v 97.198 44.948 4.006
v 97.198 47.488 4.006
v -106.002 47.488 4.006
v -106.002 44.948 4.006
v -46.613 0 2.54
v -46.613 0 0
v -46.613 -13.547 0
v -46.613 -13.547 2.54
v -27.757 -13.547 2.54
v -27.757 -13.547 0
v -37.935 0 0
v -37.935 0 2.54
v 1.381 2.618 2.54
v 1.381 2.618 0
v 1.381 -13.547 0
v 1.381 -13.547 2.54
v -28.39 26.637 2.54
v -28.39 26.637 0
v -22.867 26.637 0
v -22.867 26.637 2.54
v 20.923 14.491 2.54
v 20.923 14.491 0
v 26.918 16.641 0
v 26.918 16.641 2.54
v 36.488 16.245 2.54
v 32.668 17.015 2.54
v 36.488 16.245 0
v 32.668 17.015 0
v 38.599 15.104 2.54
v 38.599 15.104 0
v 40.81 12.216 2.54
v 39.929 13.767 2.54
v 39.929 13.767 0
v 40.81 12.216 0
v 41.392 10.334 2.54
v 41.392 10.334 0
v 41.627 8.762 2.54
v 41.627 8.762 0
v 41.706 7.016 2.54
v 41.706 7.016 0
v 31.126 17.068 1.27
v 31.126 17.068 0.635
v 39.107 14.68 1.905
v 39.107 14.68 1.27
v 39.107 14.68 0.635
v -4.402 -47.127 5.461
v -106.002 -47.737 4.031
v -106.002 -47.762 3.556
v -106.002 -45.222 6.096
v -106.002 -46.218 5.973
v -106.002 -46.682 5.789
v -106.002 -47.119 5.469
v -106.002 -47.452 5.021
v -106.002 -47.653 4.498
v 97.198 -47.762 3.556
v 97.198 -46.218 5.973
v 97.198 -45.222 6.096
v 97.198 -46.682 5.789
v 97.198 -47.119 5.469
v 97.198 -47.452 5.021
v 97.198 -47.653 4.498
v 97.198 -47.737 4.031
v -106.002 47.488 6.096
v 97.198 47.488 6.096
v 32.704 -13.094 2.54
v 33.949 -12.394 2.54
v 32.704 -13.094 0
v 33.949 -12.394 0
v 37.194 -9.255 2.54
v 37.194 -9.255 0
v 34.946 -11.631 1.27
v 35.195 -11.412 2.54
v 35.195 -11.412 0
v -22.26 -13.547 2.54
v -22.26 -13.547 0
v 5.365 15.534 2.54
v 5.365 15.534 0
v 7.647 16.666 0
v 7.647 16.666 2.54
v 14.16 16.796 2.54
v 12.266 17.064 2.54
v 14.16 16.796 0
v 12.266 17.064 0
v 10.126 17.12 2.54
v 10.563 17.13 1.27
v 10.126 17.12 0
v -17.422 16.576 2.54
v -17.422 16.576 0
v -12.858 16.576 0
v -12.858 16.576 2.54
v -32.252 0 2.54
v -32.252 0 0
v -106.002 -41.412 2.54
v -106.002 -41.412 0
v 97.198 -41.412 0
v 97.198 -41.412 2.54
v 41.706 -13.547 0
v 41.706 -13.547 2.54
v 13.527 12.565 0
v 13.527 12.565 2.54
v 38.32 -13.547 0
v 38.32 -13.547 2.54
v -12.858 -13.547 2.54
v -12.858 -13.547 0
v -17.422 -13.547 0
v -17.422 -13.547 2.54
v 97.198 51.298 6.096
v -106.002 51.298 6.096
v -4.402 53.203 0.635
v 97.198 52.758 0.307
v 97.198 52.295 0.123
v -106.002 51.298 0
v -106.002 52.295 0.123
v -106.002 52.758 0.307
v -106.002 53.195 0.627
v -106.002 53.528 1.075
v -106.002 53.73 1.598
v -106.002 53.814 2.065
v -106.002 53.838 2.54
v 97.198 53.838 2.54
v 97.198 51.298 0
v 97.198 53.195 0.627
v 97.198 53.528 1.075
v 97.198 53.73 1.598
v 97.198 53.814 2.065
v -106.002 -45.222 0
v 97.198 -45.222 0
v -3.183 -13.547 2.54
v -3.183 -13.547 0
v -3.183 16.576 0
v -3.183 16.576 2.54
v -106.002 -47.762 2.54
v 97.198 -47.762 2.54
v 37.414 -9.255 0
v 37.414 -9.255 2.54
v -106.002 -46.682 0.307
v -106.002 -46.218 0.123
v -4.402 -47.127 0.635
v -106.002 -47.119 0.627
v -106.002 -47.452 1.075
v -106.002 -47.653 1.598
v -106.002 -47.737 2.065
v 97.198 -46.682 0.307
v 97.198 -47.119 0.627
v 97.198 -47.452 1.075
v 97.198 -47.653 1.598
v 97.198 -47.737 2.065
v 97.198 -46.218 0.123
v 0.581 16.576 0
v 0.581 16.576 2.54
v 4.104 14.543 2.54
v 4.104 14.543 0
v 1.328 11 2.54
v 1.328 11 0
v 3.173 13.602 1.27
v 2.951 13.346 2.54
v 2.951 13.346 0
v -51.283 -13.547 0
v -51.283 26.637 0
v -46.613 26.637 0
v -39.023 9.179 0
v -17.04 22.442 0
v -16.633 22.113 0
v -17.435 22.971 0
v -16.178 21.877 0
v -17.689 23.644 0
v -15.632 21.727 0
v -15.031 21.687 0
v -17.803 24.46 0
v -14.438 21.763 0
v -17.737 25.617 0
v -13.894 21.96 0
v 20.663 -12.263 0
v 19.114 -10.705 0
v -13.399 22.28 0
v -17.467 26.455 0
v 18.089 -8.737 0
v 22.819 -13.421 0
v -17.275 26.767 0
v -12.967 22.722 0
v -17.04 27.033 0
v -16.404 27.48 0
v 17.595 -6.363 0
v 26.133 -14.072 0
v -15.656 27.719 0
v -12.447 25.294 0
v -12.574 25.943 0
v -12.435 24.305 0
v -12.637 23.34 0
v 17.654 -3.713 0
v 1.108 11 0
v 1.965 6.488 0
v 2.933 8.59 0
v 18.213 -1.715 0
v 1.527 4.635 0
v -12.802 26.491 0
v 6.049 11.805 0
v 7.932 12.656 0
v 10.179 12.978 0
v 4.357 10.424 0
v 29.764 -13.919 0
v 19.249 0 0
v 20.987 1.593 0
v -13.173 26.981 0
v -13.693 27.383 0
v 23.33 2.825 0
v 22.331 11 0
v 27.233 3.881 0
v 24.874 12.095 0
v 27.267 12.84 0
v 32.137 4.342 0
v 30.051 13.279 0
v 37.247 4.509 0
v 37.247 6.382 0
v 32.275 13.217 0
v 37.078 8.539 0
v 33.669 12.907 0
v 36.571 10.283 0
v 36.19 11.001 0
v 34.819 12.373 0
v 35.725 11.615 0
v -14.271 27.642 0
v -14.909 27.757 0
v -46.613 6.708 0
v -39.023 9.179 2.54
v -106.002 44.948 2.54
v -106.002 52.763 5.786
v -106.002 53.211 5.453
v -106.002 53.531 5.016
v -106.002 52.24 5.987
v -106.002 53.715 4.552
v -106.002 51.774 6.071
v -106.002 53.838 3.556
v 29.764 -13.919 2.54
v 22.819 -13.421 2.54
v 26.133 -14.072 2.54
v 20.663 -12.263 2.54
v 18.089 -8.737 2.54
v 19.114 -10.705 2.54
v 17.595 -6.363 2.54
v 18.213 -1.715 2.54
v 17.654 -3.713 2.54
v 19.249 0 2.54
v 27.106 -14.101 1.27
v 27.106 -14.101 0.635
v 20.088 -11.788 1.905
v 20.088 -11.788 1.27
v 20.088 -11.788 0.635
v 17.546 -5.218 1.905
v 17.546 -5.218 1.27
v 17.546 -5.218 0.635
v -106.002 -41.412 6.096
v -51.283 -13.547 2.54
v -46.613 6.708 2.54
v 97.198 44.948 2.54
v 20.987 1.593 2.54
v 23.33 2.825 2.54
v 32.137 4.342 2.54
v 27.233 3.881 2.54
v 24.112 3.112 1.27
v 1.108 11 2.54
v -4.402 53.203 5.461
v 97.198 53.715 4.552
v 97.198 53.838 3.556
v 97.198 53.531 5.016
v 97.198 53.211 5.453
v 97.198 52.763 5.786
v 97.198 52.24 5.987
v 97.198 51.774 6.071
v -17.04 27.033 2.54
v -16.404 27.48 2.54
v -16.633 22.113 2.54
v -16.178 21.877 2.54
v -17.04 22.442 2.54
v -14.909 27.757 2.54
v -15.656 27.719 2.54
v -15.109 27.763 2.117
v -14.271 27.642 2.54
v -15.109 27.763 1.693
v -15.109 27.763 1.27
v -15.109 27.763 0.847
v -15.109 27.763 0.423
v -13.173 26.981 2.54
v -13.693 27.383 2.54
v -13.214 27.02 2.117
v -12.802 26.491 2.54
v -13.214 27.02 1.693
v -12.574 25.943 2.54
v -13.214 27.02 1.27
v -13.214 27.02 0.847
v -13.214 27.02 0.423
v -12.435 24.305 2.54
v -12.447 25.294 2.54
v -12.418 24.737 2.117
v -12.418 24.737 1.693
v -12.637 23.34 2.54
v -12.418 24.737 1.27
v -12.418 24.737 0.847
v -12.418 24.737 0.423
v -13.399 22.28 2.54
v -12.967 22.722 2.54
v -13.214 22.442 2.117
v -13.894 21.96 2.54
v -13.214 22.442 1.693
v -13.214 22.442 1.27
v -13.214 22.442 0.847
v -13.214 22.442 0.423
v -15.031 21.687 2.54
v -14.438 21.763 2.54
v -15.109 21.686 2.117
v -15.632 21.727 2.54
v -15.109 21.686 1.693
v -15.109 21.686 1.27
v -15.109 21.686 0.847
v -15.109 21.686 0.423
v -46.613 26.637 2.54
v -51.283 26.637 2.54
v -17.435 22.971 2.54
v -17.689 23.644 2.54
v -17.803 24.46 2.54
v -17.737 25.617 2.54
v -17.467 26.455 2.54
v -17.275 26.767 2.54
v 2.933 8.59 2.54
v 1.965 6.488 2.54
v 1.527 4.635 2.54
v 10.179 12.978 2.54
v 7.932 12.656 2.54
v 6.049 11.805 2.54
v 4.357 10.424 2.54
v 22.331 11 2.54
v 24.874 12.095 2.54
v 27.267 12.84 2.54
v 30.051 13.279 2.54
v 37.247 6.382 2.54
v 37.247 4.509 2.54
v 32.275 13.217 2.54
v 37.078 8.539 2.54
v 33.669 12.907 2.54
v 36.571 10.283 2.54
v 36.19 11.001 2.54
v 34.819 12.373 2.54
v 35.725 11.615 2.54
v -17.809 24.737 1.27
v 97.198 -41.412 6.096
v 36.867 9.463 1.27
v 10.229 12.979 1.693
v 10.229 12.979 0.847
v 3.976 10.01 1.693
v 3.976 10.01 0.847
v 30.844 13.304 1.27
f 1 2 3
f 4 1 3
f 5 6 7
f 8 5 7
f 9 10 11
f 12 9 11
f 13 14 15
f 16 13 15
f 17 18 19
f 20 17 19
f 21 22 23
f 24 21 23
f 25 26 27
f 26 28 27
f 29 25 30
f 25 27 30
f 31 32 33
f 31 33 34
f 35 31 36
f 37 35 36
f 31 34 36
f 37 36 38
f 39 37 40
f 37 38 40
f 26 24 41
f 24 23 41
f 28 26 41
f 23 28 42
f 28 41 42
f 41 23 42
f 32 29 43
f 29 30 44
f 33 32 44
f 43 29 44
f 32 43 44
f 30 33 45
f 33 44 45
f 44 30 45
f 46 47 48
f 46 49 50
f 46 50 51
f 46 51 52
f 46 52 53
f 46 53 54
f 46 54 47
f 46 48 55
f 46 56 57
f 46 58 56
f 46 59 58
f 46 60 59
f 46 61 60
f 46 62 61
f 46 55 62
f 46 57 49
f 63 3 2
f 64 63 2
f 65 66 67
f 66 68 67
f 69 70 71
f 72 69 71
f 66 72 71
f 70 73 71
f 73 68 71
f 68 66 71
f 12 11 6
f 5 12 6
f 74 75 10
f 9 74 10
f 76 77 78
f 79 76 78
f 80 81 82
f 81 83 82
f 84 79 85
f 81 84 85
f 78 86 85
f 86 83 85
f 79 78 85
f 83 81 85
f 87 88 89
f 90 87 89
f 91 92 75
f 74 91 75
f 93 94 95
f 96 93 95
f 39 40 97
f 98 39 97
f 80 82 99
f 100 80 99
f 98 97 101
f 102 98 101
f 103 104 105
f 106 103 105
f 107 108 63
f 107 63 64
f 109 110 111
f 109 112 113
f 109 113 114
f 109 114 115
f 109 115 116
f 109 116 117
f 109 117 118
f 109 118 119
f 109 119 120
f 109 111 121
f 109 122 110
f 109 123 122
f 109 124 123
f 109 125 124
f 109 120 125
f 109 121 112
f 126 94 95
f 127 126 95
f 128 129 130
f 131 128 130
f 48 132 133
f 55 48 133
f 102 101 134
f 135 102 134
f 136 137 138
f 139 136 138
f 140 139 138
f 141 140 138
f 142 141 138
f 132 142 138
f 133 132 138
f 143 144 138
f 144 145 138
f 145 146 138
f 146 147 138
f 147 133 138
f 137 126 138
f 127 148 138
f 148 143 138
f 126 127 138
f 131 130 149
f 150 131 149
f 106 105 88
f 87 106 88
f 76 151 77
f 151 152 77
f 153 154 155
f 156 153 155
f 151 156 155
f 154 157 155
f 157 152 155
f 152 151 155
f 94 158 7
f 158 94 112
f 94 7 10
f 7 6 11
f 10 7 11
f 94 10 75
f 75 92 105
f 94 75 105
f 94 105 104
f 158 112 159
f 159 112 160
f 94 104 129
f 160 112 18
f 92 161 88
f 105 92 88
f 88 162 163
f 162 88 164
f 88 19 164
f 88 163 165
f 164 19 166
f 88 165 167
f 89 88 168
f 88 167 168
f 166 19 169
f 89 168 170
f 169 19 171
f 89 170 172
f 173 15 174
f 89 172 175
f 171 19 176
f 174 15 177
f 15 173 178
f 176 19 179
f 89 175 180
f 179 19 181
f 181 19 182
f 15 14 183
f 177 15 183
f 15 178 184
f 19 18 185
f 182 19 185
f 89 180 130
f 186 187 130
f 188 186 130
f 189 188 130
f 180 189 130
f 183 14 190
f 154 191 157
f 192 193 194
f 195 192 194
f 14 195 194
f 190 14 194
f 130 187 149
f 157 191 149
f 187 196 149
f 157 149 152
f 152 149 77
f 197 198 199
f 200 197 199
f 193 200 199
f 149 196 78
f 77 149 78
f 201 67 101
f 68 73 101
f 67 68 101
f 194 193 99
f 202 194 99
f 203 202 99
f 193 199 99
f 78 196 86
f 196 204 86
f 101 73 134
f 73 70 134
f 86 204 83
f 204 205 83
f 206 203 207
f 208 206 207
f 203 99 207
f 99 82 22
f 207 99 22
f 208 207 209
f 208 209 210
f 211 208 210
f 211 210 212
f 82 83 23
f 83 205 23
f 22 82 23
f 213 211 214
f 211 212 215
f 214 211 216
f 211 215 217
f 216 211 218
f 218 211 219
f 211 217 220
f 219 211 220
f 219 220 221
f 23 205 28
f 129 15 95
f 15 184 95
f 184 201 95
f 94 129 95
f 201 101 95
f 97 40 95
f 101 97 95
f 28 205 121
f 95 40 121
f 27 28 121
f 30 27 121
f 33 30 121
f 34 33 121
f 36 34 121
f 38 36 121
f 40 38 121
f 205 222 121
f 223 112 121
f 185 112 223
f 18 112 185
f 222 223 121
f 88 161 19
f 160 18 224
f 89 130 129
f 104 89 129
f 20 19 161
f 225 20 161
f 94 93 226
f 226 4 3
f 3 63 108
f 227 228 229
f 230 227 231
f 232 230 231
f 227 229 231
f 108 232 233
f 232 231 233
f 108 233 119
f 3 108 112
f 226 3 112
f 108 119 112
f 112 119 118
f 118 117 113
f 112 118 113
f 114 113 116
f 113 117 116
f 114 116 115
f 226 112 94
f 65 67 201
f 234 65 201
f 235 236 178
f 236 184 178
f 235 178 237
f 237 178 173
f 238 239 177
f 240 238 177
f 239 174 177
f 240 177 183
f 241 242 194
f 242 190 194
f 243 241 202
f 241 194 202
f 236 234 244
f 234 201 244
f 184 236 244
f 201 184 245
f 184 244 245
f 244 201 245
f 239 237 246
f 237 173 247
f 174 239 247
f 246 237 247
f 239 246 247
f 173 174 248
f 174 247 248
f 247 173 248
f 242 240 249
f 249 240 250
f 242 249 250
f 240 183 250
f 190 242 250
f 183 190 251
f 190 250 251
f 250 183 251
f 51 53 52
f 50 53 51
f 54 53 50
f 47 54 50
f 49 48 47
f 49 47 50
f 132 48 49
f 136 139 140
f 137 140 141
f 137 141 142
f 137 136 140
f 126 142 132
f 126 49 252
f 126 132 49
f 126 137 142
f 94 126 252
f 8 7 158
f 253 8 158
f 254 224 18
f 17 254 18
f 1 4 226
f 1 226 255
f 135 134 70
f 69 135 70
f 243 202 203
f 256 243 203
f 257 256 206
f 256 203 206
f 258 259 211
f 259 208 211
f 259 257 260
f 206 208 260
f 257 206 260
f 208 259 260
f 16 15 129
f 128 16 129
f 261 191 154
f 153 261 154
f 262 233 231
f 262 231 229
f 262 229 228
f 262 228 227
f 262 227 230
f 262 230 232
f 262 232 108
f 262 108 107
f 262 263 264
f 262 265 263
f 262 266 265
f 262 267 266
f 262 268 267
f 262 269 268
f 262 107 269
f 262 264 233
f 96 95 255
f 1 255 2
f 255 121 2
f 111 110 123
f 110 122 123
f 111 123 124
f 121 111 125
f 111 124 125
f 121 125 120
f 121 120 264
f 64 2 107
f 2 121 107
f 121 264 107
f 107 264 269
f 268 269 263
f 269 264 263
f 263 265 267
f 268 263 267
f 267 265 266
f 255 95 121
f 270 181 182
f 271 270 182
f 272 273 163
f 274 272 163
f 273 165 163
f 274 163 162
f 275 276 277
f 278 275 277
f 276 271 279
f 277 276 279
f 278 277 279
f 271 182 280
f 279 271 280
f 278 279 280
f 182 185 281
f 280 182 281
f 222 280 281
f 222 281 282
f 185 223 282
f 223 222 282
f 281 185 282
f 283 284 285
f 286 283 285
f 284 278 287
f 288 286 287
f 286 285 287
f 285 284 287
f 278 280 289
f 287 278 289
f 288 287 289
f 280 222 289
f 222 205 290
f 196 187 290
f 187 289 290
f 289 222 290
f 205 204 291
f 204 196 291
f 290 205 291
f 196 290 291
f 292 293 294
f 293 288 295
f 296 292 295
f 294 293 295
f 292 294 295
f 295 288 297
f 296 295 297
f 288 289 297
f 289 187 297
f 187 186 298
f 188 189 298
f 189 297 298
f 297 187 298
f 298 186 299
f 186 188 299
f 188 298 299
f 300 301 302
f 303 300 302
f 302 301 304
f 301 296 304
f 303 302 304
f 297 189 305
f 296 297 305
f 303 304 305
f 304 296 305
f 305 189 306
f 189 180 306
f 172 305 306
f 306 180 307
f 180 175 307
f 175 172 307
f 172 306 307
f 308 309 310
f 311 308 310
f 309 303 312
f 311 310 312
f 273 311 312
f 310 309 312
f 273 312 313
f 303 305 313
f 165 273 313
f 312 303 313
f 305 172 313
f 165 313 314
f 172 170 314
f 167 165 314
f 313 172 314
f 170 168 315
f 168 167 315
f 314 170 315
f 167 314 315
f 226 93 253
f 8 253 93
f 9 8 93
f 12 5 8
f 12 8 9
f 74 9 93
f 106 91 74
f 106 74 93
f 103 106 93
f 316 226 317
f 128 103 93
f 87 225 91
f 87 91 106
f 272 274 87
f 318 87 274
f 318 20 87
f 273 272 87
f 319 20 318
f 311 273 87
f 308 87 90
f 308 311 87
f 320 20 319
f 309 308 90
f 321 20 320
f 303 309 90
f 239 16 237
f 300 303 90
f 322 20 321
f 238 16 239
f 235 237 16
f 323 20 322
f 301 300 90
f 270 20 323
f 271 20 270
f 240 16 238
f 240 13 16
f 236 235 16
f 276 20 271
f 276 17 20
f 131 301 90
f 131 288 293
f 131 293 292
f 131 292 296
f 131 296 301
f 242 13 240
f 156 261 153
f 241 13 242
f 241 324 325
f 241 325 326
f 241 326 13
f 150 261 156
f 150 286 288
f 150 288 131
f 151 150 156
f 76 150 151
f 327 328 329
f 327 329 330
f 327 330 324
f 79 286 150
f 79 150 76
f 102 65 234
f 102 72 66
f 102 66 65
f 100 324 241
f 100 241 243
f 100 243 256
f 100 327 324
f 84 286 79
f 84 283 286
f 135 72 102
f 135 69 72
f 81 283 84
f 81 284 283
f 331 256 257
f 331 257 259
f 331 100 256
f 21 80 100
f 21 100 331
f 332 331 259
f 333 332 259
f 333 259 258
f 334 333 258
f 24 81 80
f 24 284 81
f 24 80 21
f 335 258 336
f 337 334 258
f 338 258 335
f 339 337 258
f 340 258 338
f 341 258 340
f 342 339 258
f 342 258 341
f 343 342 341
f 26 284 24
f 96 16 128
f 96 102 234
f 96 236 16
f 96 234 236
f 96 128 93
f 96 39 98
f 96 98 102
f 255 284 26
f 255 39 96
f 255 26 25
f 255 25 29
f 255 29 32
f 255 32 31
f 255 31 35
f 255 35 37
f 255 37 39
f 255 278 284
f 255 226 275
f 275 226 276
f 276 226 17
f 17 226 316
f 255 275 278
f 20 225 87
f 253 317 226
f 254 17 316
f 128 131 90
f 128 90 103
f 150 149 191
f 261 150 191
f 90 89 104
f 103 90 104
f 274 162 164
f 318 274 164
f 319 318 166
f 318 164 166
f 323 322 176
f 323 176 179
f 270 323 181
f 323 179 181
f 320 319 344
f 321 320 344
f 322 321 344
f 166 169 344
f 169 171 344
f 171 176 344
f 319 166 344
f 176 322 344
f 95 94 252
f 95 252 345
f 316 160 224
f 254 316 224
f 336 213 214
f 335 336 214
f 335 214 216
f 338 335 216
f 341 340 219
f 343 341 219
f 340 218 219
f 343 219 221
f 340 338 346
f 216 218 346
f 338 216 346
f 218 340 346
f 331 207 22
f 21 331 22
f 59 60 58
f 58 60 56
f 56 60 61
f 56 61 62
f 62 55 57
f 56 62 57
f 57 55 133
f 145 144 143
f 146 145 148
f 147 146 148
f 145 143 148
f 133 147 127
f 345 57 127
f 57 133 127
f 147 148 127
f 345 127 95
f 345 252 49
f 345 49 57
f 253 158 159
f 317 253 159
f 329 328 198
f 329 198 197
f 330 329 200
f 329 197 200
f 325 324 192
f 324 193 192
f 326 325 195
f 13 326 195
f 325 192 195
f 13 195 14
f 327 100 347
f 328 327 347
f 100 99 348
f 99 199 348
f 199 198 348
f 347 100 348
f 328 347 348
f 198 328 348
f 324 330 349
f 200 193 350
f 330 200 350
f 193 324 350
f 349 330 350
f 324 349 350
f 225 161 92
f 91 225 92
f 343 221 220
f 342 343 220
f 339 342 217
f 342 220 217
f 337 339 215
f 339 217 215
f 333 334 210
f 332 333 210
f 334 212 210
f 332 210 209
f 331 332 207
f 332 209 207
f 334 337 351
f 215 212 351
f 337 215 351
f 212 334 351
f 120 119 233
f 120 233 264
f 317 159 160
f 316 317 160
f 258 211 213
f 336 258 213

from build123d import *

# Parameters (mm, degrees)
F0_W          = 203.2
F0_H          = 6.35
F1_DEPTH      = 6.096
F0_H_2        = 88.9
F2_DEPTH      = 2.54
F4_DEPTH      = 2.54
F5_T1_DEPTH   = 215.9
F5_2_T1_DEPTH = 215.9


# Not quite as in the source:
# - a fillet or chamfer that OpenCascade refuses, or shapes differently, is made with other operations: its cross-section is extruded or revolved along the edge and cut away or added


with BuildPart() as f1:
    # F0 (on Top) → F1 (new body)
    with BuildSketch(Plane.XY):
        with Locations((-4.4018315911, 50.6631300867)):
            Rectangle(F0_W, F0_H)
    extrude(amount=F1_DEPTH)



with BuildPart() as f1b:
    # F0 (on Top) → F1, piece 2 (new body)
    with BuildSketch(Plane.XY):
        with Locations((-4.4018315911, -44.5868699133)):
            Rectangle(F0_W, F0_H)
    extrude(amount=F1_DEPTH)

    # F5: fillet of radius 2.54 on 2 edges, made by hand

    # F5_s2 → F5_t1 (cut)
    with BuildSketch(Plane.YZ.offset(-112.3518315911)):
        with BuildLine():
            add(Edge.make_bspline(
                [(-47.7618699133, 3.556), (-47.7618699133, 6.096), (-45.2218699133, 6.096)],
                knots=[0, 0, 0, 1, 1, 1], degree=2, weights=[1, 1, 1]))
            Line((-45.2218699133, 6.096), (-47.7618699133, 6.096))
            Line((-47.7618699133, 6.096), (-47.7618699133, 3.556))
        make_face()
        with BuildLine():
            add(Edge.make_bspline(
                [(-47.7618699133, 2.54), (-47.7618699133, 0), (-45.2218699133, 0)],
                knots=[0, 0, 0, 1, 1, 1], degree=2, weights=[1, 1, 1]))
            Line((-45.2218699133, 0), (-47.7618699133, 0))
            Line((-47.7618699133, 0), (-47.7618699133, 2.54))
        make_face()
    extrude(amount=F5_T1_DEPTH, mode=Mode.SUBTRACT)


with BuildPart() as f2:
    # F0 (on Top) → F2 (new body)
    with BuildSketch(Plane.XY):
        with Locations((-4.4018315911, 3.0381300867)):
            Rectangle(F0_W, F0_H_2)
        Polygon((-12.8579193956, 16.5757056756), (-12.8579193956, 0), (-12.8579193956, -13.5469855741), (-17.4224965514, -13.5469855741), (-17.4224965514, 0), (-17.4224965514, 16.5757056756), align=None, mode=Mode.SUBTRACT)
        with BuildLine():
            Line((-3.1834784103, -13.5469855741), (-3.1834784103, 0))
            Line((-3.1834784103, 0), (-3.1834784103, 16.5757056756))
            Line((-3.1834784103, 16.5757056756), (0.5807586276, 16.5757056756))
            Line((0.5807586276, 16.5757056756), (1.1084554086, 10.9997096895))
            Line((1.1084554086, 10.9997096895), (1.3283290674, 10.9997096895))
            add(Edge.make_bspline(
                [(1.3283290674, 10.9997096895), (2.9993688739, 13.9372217705), (5.3652094422, 15.5335045331)],
                knots=[0, 0, 0, 1, 1, 1], degree=2))
            add(Edge.make_bspline(
                [(5.3652094422, 15.5335045331), (7.7310500104, 17.1297872956), (10.5630227352, 17.1297872956)],
                knots=[0, 0, 0, 1, 1, 1], degree=2))
            add(Edge.make_bspline(
                [(10.5630227352, 17.1297872956), (12.568270503, 17.1297872956), (14.1601557924, 16.7955793343)],
                knots=[0, 0, 0, 1, 1, 1], degree=2))
            Line((14.1601557924, 16.7955793343), (13.5269196552, 12.5652101399))
            add(Edge.make_bspline(
                [(13.5269196552, 12.5652101399), (11.6623910289, 12.9785726183), (10.2288147739, 12.9785726183)],
                knots=[0, 0, 0, 1, 1, 1], degree=2))
            add(Edge.make_bspline(
                [(10.2288147739, 12.9785726183), (6.5701170921, 12.9785726183), (3.9756079188, 10.0102782251)],
                knots=[0, 0, 0, 1, 1, 1], degree=2))
            add(Edge.make_bspline(
                [(3.9756079188, 10.0102782251), (1.3810987455, 7.0419838319), (1.3810987455, 2.6181258177)],
                knots=[0, 0, 0, 1, 1, 1], degree=2))
            Line((1.3810987455, 2.6181258177), (1.3810987455, 0))
            Line((1.3810987455, 0), (1.3810987455, -13.5469855741))
            Line((1.3810987455, -13.5469855741), (-3.1834784103, -13.5469855741))
        make_face(mode=Mode.SUBTRACT)
        with BuildLine():
            add(Edge.make_bspline(
                [(17.5462101373, -5.2181713804), (17.5462101373, -2.1025919099), (19.248891356, 0)],
                knots=[0, 0, 0, 0.3416070953, 0.3416070953, 0.3416070953], degree=2))
            add(Edge.make_bspline(
                [(19.248891356, 0), (22.5305364068, 4.0524087886), (32.1370261324, 4.3419353024)],
                knots=[0.3416070953, 0.3416070953, 0.3416070953, 1, 1, 1], degree=2))
            Line((32.1370261324, 4.3419353024), (37.2468899619, 4.509039283))
            Line((37.2468899619, 4.509039283), (37.2468899619, 6.3823628556))
            add(Edge.make_bspline(
                [(37.2468899619, 6.3823628556), (37.2468899619, 9.9267262348), (35.7253642433, 11.615355934)],
                knots=[0, 0, 0, 1, 1, 1], degree=2))
            add(Edge.make_bspline(
                [(35.7253642433, 11.615355934), (34.2038385247, 13.3039856333), (30.8441690189, 13.3039856333)],
                knots=[0, 0, 0, 1, 1, 1], degree=2))
            add(Edge.make_bspline(
                [(30.8441690189, 13.3039856333), (27.079931981, 13.3039856333), (22.3306609518, 10.9997096895)],
                knots=[0, 0, 0, 1, 1, 1], degree=2))
            Line((22.3306609518, 10.9997096895), (20.9234695358, 14.4913033906))
            add(Edge.make_bspline(
                [(20.9234695358, 14.4913033906), (23.1485909624, 15.6962110406), (25.800267287, 16.3822168559)],
                knots=[0, 0, 0, 1, 1, 1], degree=2))
            add(Edge.make_bspline(
                [(25.800267287, 16.3822168559), (28.4519436116, 17.0682226712), (31.1256073021, 17.0682226712)],
                knots=[0, 0, 0, 1, 1, 1], degree=2))
            add(Edge.make_bspline(
                [(31.1256073021, 17.0682226712), (36.5081144684, 17.0682226712), (39.1070211149, 14.6803947371)],
                knots=[0, 0, 0, 1, 1, 1], degree=2))
            add(Edge.make_bspline(
                [(39.1070211149, 14.6803947371), (41.7059277614, 12.292566803), (41.7059277614, 7.0155989928)],
                knots=[0, 0, 0, 1, 1, 1], degree=2))
            Line((41.7059277614, 7.0155989928), (41.7059277614, 0))
            Line((41.7059277614, 0), (41.7059277614, -13.5469855741))
            Line((41.7059277614, -13.5469855741), (38.3198734166, -13.5469855741))
            Line((38.3198734166, -13.5469855741), (37.4139939425, -9.2550517551))
            Line((37.4139939425, -9.2550517551), (37.1941202838, -9.2550517551))
            add(Edge.make_bspline(
                [(37.1941202838, -9.2550517551), (34.9426140181, -12.0870244799), (32.7043001719, -13.094045837)],
                knots=[0, 0, 0, 1, 1, 1], degree=2))
            add(Edge.make_bspline(
                [(32.7043001719, -13.094045837), (30.4659863258, -14.1010671941), (27.10631682, -14.1010671941)],
                knots=[0, 0, 0, 1, 1, 1], degree=2))
            add(Edge.make_bspline(
                [(27.10631682, -14.1010671941), (22.6296891277, -14.1010671941), (20.0879496325, -11.787996304)],
                knots=[0, 0, 0, 1, 1, 1], degree=2))
            add(Edge.make_bspline(
                [(20.0879496325, -11.787996304), (17.5462101373, -9.4749254139), (17.5462101373, -5.2181713804)],
                knots=[0, 0, 0, 1, 1, 1], degree=2))
        make_face(mode=Mode.SUBTRACT)
        Polygon((-39.0228847876, 9.179155795), (-32.2521916973, 0), (-22.259717044, -13.5469855741), (-27.7565585129, -13.5469855741), (-37.9351374754, 0), (-46.6129234879, 0), (-46.6129234879, -13.5469855741), (-51.2830399999, -13.5469855741), (-51.2830399999, 0), (-51.2830399999, 26.6371243003), (-46.6129234879, 26.6371243003), (-46.6129234879, 6.7077758706), (-28.3897946501, 26.6371243003), (-22.8665683422, 26.6371243003), align=None, mode=Mode.SUBTRACT)
        with BuildLine():
            add(Edge.make_bspline(
                [(-17.0399163851, 22.4419348912), (-17.8094741908, 23.1983002773), (-17.8094741908, 24.7374158886)],
                knots=[0, 0, 0, 1, 1, 1], degree=2))
            add(Edge.make_bspline(
                [(-17.8094741908, 24.7374158886), (-17.8094741908, 26.302916339), (-17.0399163851, 27.032896886)],
                knots=[0, 0, 0, 1, 1, 1], degree=2))
            add(Edge.make_bspline(
                [(-17.0399163851, 27.032896886), (-16.2703585795, 27.7628774331), (-15.1094256612, 27.7628774331)],
                knots=[0, 0, 0, 1, 1, 1], degree=2))
            add(Edge.make_bspline(
                [(-15.1094256612, 27.7628774331), (-14.0100573675, 27.7628774331), (-13.2141147228, 27.0197044665)],
                knots=[0, 0, 0, 1, 1, 1], degree=2))
            add(Edge.make_bspline(
                [(-13.2141147228, 27.0197044665), (-12.4181720781, 26.2765314999), (-12.4181720781, 24.7374158886)],
                knots=[0, 0, 0, 1, 1, 1], degree=2))
            add(Edge.make_bspline(
                [(-12.4181720781, 24.7374158886), (-12.4181720781, 23.1983002773), (-13.2141147228, 22.4419348912)],
                knots=[0, 0, 0, 1, 1, 1], degree=2))
            add(Edge.make_bspline(
                [(-13.2141147228, 22.4419348912), (-14.0100573675, 21.6855695051), (-15.1094256612, 21.6855695051)],
                knots=[0, 0, 0, 1, 1, 1], degree=2))
            add(Edge.make_bspline(
                [(-15.1094256612, 21.6855695051), (-16.2703585795, 21.6855695051), (-17.0399163851, 22.4419348912)],
                knots=[0, 0, 0, 1, 1, 1], degree=2))
        make_face(mode=Mode.SUBTRACT)
    extrude(amount=F2_DEPTH)


with BuildPart() as f1_1:
    add(f1.part)

    add(f2.part)  # F4 merges F2
    # F3 (on face) → F4 (join)
    with BuildSketch(Plane.XZ.offset(-47.4881300867)):
        Polygon((97.1981684089, 4.0059988387), (-106.0018315911, 4.0059988387), (-106.0018315911, 2.044348279), (-48.8064140081, 2.044348279), (97.1981684089, 2.044348279), align=None)
    extrude(amount=F4_DEPTH)

    # F5#2: fillet of radius 2.54 on 2 edges, made by hand

    # F5_2_s2 → F5_2_t1 (cut)
    with BuildSketch(Plane.YZ.offset(-112.3518315911)):
        with BuildLine():
            add(Edge.make_bspline(
                [(51.2981300867, 6.096), (53.8381300867, 6.096), (53.8381300867, 3.556)],
                knots=[0, 0, 0, 1, 1, 1], degree=2, weights=[1, 1, 1]))
            Line((53.8381300867, 3.556), (53.8381300867, 6.096))
            Line((53.8381300867, 6.096), (51.2981300867, 6.096))
        make_face()
        with BuildLine():
            add(Edge.make_bspline(
                [(53.8381300867, 2.54), (53.8381300867, 0), (51.2981300867, 0)],
                knots=[0, 0, 0, 1, 1, 1], degree=2, weights=[1, 1, 1]))
            Line((51.2981300867, 0), (53.8381300867, 0))
            Line((53.8381300867, 0), (53.8381300867, 2.54))
        make_face()
    extrude(amount=F5_2_T1_DEPTH, mode=Mode.SUBTRACT)


solid = Compound([f1b.part, f1_1.part])
